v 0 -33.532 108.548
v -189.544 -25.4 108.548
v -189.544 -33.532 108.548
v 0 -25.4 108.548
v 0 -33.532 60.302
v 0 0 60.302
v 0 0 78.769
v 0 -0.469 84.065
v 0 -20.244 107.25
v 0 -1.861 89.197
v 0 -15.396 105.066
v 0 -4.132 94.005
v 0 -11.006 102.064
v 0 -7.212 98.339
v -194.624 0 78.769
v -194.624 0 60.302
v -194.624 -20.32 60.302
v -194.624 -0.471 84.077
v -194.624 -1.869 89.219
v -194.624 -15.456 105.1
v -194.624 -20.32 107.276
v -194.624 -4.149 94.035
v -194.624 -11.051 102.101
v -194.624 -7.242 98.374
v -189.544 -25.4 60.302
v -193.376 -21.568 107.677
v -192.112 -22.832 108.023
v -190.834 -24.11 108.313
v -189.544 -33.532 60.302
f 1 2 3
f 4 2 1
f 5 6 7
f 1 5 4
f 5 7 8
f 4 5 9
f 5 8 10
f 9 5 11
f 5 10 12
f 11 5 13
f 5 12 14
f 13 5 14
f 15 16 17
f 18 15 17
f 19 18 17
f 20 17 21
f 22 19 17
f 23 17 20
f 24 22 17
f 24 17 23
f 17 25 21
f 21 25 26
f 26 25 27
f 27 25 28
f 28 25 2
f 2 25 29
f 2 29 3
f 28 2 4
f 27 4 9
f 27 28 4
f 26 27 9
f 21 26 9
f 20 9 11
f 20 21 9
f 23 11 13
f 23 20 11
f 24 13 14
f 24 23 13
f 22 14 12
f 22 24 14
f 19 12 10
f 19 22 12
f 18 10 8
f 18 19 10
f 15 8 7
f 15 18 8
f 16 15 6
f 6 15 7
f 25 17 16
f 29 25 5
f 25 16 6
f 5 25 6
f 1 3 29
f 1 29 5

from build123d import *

# Parameters (mm, degrees)
F0_W        = 194.6241557598
F0_H        = 48.2458211482
F1_DEPTH    = 25.4
F2_T1_DEPTH = 343.5218255279
F3_SIZE     = 5.08
F4_W        = 189.5441557598
F4_H        = 48.2458211482
F5_DEPTH    = 8.1318449229


# Not quite as in the source:
# - a fillet or chamfer that OpenCascade refuses, or shapes differently, is made with other operations: its cross-section is extruded or revolved along the edge and cut away or added


with BuildPart() as f1:
    # F0 (on Front) → F1 (new body)
    with BuildSketch(Plane.XZ):
        with Locations((-97.3120778799, 84.4252165407)):
            Rectangle(F0_W, F0_H)
    extrude(amount=F1_DEPTH)

    # F2: fillet of radius 30.1570992617 on 1 edges, made by hand

    # F2_s2 → F2_t1 (cut)
    with BuildSketch(Plane.YZ.offset(-269.0729906439)):
        with BuildLine():
            ThreePointArc((-25.4, 108.5481271148), (-7.2124816956, 98.3388553113), (0, 78.7685931612))
            Line((0, 78.7685931612), (0, 108.5481271148))
            Line((0, 108.5481271148), (-25.4, 108.5481271148))
        make_face()
    extrude(amount=F2_T1_DEPTH, mode=Mode.SUBTRACT)

    # F3
    f3_edges = [f1.edges().sort_by_distance(p)[0] for p in [
        (-194.624156, -25.4, 84.425217),
    ]]
    chamfer(f3_edges, length=F3_SIZE)

    # F4 (on face) → F5 (join)
    with BuildSketch(Plane.XZ.offset(25.4)):
        with Locations((-94.7720778799, 84.4252165407)):
            Rectangle(F4_W, F4_H)
    extrude(amount=F5_DEPTH)


solid = f1.part
